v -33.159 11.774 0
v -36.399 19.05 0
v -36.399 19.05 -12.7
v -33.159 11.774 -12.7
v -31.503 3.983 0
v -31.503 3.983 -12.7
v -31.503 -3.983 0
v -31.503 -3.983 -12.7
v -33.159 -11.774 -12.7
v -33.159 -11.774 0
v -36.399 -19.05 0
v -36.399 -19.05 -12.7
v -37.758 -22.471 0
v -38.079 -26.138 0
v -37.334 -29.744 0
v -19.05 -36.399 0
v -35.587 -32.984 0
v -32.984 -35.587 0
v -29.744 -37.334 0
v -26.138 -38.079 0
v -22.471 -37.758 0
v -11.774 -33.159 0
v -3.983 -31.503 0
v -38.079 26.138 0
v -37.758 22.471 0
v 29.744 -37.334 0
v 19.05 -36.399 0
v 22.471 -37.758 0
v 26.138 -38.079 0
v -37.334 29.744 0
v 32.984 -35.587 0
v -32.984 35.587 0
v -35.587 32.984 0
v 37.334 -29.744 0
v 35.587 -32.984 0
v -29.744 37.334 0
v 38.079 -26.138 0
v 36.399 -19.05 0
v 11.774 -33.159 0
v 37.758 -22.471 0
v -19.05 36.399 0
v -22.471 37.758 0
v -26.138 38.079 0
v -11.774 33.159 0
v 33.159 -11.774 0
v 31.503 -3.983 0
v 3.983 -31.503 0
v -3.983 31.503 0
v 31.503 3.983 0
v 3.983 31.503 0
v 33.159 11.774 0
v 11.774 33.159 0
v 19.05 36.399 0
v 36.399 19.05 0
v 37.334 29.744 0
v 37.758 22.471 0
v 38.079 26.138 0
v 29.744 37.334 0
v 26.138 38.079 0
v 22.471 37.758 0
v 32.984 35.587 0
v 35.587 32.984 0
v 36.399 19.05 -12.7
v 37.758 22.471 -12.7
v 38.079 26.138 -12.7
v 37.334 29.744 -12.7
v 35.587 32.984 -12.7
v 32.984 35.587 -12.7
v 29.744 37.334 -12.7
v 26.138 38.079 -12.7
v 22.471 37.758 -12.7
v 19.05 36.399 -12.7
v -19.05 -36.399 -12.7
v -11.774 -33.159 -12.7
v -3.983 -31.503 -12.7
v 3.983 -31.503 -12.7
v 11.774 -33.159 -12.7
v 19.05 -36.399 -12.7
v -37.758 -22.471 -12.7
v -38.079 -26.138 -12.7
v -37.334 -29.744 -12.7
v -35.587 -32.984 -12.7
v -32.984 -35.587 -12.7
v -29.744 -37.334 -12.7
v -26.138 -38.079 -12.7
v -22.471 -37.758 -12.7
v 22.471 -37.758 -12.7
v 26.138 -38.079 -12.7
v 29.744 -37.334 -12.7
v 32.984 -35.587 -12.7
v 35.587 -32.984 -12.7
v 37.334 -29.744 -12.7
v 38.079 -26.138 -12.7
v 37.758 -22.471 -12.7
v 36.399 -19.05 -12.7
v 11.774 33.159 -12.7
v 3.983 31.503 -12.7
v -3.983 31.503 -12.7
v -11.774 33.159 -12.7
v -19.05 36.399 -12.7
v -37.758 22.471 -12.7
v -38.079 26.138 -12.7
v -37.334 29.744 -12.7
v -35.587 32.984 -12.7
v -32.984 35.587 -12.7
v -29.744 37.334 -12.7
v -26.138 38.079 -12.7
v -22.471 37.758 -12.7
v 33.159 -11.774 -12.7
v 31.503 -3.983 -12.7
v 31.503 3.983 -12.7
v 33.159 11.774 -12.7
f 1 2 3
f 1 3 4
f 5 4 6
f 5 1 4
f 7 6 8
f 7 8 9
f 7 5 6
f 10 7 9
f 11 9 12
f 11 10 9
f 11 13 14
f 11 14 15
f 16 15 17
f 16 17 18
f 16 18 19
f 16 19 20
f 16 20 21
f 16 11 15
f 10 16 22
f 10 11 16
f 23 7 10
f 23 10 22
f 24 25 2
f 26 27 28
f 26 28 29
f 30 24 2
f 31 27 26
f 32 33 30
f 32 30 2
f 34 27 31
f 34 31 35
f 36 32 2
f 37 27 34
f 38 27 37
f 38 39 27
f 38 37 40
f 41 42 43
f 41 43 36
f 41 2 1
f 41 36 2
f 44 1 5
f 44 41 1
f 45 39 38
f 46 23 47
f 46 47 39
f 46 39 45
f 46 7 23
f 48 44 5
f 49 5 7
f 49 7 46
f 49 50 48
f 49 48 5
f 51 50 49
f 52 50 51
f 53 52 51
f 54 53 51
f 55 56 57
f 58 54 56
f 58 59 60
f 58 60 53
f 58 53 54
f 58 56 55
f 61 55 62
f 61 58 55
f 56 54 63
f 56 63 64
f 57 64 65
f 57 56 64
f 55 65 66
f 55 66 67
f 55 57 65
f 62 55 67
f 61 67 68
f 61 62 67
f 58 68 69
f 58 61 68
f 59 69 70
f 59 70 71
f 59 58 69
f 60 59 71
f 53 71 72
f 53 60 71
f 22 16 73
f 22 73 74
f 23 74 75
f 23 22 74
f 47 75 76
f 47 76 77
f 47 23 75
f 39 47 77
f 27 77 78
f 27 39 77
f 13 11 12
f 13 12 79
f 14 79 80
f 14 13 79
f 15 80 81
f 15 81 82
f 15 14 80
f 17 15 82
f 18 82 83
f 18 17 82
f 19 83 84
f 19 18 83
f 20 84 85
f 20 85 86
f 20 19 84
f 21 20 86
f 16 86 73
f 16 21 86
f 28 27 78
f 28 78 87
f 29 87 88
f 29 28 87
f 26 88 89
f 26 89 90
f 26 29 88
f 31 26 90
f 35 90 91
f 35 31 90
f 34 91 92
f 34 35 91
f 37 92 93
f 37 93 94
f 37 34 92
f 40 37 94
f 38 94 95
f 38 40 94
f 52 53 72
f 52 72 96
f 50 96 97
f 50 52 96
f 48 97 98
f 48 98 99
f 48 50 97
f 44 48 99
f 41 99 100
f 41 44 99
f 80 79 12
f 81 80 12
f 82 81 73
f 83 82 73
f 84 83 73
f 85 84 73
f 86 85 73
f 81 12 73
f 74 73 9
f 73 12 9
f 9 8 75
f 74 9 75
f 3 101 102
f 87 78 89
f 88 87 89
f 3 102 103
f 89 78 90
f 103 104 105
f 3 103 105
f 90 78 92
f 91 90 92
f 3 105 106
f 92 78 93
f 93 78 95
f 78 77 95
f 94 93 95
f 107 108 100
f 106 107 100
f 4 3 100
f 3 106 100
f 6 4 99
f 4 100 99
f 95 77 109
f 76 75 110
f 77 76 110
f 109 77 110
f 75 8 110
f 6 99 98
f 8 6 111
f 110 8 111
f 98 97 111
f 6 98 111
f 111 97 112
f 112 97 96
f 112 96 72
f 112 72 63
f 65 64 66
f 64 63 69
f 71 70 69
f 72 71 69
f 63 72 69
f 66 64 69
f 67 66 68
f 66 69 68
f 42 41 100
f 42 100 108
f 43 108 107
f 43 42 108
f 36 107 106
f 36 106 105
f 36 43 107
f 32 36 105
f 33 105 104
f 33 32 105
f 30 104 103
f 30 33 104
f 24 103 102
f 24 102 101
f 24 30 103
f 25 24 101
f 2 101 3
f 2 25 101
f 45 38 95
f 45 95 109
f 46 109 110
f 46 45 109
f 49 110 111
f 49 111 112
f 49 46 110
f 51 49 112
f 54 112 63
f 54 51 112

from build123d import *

# Parameters (mm, degrees)
EXTRUDE_1_DEPTH = 12.7


with BuildPart() as part:
    # 스케치1 → 보스-돌출1 (new body)
    with BuildSketch(Plane.XY):
        with BuildLine():
            ThreePointArc((-19.05, 36.398522628), (-34.380256121, 34.380256121), (-36.398522628, 19.05))
            ThreePointArc((-36.398522628, 19.05), (-31.294090512, 0), (-36.398522628, -19.05))
            ThreePointArc((-36.398522628, -19.05), (-34.380256121, -34.380256121), (-19.05, -36.398522628))
            ThreePointArc((-19.05, -36.398522628), (0, -31.294090512), (19.05, -36.398522628))
            ThreePointArc((19.05, -36.398522628), (34.380256121, -34.380256121), (36.398522628, -19.05))
            ThreePointArc((36.398522628, -19.05), (31.294090512, 0), (36.398522628, 19.05))
            ThreePointArc((36.398522628, 19.05), (34.380256121, 34.380256121), (19.05, 36.398522628))
            ThreePointArc((19.05, 36.398522628), (0, 31.294090512), (-19.05, 36.398522628))
        make_face()
    extrude(amount=-EXTRUDE_1_DEPTH)


solid = part.part
